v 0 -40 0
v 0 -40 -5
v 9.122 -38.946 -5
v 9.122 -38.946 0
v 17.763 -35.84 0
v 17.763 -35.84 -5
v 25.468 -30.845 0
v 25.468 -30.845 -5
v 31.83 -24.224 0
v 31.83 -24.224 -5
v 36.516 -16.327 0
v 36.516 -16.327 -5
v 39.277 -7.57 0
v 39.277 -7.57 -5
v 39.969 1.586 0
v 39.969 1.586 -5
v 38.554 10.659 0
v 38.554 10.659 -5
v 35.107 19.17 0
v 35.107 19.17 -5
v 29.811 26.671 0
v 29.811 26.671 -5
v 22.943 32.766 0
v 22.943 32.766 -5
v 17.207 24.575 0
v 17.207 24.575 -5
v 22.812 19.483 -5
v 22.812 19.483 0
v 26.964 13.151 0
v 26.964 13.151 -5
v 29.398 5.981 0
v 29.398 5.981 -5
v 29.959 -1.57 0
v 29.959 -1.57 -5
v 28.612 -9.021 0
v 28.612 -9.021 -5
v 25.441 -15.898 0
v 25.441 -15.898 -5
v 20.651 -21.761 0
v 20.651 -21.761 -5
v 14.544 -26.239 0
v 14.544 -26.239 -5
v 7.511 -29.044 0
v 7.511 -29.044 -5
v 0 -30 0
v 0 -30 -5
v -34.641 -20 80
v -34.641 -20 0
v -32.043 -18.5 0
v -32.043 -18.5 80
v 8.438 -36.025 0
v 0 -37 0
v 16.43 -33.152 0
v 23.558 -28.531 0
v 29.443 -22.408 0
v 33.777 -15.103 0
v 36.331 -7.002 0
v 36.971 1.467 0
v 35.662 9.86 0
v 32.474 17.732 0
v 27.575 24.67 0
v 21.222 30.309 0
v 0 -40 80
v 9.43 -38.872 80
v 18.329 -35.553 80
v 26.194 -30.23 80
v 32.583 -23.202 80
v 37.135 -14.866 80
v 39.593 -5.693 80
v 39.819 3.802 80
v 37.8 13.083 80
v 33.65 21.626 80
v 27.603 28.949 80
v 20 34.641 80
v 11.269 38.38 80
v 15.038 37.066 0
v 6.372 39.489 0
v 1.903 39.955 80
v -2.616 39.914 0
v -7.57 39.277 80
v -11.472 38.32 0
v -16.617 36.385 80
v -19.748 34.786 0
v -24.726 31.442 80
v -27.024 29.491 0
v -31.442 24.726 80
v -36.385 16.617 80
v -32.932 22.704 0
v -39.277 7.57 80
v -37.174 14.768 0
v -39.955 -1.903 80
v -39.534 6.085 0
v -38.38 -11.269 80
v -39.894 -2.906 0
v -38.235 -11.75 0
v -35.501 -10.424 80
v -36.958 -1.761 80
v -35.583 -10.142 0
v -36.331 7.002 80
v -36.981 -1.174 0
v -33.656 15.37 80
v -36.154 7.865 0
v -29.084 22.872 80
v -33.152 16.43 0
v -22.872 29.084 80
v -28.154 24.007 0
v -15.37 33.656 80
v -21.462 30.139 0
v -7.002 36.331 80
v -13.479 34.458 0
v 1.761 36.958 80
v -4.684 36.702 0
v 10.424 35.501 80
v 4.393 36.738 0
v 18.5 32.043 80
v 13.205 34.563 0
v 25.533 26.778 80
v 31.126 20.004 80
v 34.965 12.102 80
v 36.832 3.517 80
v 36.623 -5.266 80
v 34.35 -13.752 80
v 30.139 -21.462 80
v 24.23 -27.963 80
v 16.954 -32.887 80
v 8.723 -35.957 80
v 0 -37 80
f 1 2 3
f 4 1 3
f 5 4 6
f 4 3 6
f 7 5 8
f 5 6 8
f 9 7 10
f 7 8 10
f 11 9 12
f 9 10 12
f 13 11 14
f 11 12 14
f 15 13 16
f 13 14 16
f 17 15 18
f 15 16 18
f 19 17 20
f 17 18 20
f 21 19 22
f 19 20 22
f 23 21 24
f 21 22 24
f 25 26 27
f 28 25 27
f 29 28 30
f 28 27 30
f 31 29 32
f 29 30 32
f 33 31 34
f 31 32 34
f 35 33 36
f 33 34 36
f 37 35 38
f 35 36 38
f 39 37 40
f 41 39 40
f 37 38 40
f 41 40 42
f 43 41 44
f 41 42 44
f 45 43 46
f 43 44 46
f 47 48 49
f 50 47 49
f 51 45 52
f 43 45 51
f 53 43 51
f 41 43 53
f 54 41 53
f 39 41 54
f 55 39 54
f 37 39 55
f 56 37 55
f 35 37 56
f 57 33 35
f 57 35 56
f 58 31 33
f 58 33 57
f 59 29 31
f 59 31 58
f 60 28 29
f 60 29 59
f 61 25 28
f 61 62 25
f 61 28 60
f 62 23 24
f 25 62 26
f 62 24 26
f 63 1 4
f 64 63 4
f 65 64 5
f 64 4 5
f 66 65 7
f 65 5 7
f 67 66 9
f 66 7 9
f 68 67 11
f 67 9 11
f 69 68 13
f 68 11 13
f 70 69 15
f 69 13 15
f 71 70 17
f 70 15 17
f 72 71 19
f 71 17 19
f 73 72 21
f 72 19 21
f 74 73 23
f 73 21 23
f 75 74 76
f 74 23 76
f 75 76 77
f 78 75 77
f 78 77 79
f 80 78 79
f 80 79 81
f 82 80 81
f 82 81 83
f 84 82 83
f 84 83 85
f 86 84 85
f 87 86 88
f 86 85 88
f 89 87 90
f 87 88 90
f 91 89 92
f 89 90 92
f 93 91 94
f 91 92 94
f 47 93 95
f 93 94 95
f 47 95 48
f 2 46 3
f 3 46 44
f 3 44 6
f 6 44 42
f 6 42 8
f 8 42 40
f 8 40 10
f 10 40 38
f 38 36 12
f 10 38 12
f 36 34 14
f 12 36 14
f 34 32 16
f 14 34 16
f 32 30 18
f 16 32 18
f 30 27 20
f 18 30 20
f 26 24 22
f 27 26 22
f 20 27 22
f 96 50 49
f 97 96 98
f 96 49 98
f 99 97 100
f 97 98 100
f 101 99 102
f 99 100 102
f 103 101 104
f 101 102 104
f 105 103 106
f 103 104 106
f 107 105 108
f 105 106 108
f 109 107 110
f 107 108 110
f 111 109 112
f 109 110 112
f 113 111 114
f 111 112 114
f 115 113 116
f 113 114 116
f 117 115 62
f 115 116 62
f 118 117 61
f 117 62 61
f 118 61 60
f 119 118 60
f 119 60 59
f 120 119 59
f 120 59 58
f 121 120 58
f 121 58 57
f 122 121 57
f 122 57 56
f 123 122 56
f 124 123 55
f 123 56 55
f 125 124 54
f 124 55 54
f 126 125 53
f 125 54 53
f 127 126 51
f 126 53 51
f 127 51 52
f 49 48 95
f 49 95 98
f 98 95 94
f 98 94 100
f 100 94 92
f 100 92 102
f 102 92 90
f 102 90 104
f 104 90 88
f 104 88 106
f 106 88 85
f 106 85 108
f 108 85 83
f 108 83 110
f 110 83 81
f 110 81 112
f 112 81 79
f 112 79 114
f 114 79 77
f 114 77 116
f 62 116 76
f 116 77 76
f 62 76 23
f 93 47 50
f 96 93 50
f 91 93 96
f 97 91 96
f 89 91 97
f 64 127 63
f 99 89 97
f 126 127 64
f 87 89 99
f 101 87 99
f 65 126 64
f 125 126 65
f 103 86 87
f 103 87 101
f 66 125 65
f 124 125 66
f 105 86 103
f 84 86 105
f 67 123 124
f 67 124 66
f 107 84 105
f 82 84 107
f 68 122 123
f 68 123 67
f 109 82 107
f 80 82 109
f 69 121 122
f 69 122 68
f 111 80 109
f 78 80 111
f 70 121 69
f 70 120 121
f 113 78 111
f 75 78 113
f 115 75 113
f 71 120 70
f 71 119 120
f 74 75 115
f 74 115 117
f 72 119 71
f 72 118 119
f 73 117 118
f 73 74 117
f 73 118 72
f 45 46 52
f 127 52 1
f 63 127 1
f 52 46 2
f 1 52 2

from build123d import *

# Parameters (mm, degrees)
EXTRUDE_1_DEPTH = 80
EXTRUDE_START   = 5
EXTRUDE_2_DEPTH = 5


with BuildPart() as part:
    # 草圖1 → 填料-伸長1 (new body)
    with BuildSketch(Plane.XY):
        with BuildLine():
            Line((0, -37), (0, -40))
            ThreePointArc((0, -40), (20, 34.641016151), (-34.641016151, -20))
            Line((-34.641016151, -20), (-32.04293994, -18.5))
            ThreePointArc((-32.04293994, -18.5), (18.5, 32.04293994), (0, -37))
        make_face()
    extrude(amount=EXTRUDE_1_DEPTH)

    # 草圖2 → 填料-伸長2 (add)
    with BuildSketch(Plane(origin=(0, 0, 0), x_dir=(-1, 0, 0), z_dir=(0, 0, -1)).offset(EXTRUDE_START)):
        with BuildLine():
            Line((0, -30), (0, -40))
            ThreePointArc((0, -40), (-38.14867803, -12.02823198), (-22.943057454, 32.766081772))
            Line((-22.943057454, 32.766081772), (-17.207293091, 24.574561329))
            ThreePointArc((-17.207293091, 24.574561329), (-28.611508522, -9.021173985), (0, -30))
        make_face()
    extrude(amount=-EXTRUDE_2_DEPTH)


solid = part.part
